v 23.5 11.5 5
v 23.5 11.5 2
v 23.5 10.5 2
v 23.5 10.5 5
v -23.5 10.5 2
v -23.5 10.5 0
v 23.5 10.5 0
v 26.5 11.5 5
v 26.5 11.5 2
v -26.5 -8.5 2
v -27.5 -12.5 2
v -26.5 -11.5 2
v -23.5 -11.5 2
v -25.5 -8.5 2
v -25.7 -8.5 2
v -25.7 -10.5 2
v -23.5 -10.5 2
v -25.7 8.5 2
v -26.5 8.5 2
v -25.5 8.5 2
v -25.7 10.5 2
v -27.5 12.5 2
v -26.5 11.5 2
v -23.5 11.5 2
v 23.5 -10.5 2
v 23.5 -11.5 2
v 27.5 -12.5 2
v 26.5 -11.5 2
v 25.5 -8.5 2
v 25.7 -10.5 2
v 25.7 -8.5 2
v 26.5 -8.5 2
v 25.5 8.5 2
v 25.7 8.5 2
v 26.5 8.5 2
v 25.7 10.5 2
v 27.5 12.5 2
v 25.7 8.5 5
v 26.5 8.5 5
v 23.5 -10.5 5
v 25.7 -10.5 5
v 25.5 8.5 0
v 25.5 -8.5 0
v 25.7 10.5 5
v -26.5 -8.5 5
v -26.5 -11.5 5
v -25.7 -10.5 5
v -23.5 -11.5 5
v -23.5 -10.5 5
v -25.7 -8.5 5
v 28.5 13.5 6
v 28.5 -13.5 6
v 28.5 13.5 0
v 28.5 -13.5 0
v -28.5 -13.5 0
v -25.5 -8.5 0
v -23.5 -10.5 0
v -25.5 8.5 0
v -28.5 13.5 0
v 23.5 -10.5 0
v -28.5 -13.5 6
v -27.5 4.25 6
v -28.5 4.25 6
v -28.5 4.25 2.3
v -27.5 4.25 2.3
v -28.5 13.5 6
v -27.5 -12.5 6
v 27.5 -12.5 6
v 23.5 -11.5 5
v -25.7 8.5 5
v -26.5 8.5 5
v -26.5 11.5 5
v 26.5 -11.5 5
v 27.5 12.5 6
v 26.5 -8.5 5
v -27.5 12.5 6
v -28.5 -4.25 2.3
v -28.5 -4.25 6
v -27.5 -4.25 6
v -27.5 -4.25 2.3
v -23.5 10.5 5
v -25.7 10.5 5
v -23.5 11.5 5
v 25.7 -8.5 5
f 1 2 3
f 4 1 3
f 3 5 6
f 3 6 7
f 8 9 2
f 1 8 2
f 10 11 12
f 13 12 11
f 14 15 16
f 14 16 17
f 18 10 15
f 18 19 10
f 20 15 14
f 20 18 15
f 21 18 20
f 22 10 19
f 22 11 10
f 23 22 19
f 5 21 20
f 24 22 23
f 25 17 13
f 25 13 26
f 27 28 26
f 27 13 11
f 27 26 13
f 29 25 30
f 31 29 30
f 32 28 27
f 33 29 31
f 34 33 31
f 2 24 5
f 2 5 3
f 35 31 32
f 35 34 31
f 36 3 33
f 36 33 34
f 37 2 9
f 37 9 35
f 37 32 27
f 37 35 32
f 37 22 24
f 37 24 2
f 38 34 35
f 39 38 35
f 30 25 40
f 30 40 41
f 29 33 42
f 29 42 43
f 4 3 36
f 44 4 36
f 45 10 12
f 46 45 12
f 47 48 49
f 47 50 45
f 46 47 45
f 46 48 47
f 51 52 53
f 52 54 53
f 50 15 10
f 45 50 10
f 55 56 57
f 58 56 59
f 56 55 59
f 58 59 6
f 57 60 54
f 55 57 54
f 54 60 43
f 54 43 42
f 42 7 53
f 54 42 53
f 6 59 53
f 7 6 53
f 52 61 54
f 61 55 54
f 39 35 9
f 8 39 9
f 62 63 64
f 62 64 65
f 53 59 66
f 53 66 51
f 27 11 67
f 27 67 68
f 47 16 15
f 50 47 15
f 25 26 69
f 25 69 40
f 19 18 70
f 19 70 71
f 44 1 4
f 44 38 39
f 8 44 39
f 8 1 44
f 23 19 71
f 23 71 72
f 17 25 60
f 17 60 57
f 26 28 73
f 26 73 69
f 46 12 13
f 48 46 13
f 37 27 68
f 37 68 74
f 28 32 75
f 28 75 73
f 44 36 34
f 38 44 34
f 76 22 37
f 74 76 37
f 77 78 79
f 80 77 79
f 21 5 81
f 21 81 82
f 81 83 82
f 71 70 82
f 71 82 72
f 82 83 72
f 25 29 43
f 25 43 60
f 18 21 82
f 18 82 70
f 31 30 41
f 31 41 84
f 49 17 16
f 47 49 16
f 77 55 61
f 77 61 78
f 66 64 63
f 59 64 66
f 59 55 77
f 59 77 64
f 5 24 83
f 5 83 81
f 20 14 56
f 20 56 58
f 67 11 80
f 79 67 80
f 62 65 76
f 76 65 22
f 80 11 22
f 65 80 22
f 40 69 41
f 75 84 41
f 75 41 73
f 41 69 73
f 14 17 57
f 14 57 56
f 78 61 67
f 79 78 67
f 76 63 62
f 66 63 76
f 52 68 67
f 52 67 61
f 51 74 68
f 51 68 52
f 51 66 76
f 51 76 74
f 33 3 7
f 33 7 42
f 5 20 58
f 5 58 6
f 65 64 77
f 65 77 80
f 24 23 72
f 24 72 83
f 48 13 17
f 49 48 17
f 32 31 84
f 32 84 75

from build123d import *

# Parameters (mm, degrees)
SKETCH_W                = 57
SKETCH_H                = 27
PAD_DEPTH               = 2
PAD001_DEPTH            = 3
PAD001_MIRRORED_2_DEPTH = 3
POCKET_DEPTH            = 2
SKETCH003_W             = 57
SKETCH003_H             = 27
SKETCH003_W_2           = 55
SKETCH003_H_2           = 25
PAD002_DEPTH            = 4
SKETCH004_W             = 1
SKETCH004_H             = 8.5
POCKET001_DEPTH         = 3.7


with BuildPart() as part:
    # Sketch → Pad (new body)
    with BuildSketch(Plane.XY):
        Rectangle(SKETCH_W, SKETCH_H)
    extrude(amount=PAD_DEPTH)

    # Sketch001 (on Face6 of Pad) → Pad001 (join)
    with BuildSketch(Plane.XY.offset(2)):
        Polygon((-26.5, 11.5), (-23.5, 11.5), (-23.5, 10.5), (-25.7, 10.5), (-25.7, 8.5), (-26.5, 8.5), align=None)
    pad001 = extrude(amount=PAD001_DEPTH)

    # Sketch001 Mirrored 2 → Pad001 Mirrored 2 (add)
    with BuildSketch(Plane(origin=(0, 0, 2), x_dir=(-1, 0, 0), z_dir=(0, 0, -1))):
        Polygon((-26.5, 11.5), (-23.5, 11.5), (-23.5, 10.5), (-25.7, 10.5), (-25.7, 8.5), (-26.5, 8.5), align=None)
    pad001_mirrored_2 = extrude(amount=-PAD001_MIRRORED_2_DEPTH)

    # Mirrored001: Pad001, Pad001 Mirrored 2 across Sketch001 H_Axis
    add(pad001.mirror(Plane(origin=(0, 0, 2), x_dir=(0, 0, 1), z_dir=(0, 1, 0))))
    add(pad001_mirrored_2.mirror(Plane(origin=(0, 0, 2), x_dir=(0, 0, 1), z_dir=(0, 1, 0))))

    # Sketch002 (on Face5 of MultiTransform) → Pocket (cut)
    with BuildSketch(Plane.XY.offset(2)):
        Polygon((23.5, 10.5), (25.5, 8.5), (25.5, -8.5), (23.5, -10.5), (-23.5, -10.5), (-25.5, -8.5), (-25.5, 8.5), (-23.5, 10.5), align=None)
    extrude(amount=-POCKET_DEPTH, mode=Mode.SUBTRACT)

    # Sketch003 (on Face5 of Pocket) → Pad002 (join)
    with BuildSketch(Plane.XY.offset(2)):
        Rectangle(SKETCH003_W, SKETCH003_H)
        Rectangle(SKETCH003_W_2, SKETCH003_H_2, mode=Mode.SUBTRACT)
    extrude(amount=PAD002_DEPTH)

    # Sketch004 (on Face17 of Pad002) → Pocket001 (cut)
    with BuildSketch(Plane.XY.offset(6)):
        with Locations((-28, 0)):
            Rectangle(SKETCH004_W, SKETCH004_H)
    extrude(amount=-POCKET001_DEPTH, mode=Mode.SUBTRACT)


solid = part.part
